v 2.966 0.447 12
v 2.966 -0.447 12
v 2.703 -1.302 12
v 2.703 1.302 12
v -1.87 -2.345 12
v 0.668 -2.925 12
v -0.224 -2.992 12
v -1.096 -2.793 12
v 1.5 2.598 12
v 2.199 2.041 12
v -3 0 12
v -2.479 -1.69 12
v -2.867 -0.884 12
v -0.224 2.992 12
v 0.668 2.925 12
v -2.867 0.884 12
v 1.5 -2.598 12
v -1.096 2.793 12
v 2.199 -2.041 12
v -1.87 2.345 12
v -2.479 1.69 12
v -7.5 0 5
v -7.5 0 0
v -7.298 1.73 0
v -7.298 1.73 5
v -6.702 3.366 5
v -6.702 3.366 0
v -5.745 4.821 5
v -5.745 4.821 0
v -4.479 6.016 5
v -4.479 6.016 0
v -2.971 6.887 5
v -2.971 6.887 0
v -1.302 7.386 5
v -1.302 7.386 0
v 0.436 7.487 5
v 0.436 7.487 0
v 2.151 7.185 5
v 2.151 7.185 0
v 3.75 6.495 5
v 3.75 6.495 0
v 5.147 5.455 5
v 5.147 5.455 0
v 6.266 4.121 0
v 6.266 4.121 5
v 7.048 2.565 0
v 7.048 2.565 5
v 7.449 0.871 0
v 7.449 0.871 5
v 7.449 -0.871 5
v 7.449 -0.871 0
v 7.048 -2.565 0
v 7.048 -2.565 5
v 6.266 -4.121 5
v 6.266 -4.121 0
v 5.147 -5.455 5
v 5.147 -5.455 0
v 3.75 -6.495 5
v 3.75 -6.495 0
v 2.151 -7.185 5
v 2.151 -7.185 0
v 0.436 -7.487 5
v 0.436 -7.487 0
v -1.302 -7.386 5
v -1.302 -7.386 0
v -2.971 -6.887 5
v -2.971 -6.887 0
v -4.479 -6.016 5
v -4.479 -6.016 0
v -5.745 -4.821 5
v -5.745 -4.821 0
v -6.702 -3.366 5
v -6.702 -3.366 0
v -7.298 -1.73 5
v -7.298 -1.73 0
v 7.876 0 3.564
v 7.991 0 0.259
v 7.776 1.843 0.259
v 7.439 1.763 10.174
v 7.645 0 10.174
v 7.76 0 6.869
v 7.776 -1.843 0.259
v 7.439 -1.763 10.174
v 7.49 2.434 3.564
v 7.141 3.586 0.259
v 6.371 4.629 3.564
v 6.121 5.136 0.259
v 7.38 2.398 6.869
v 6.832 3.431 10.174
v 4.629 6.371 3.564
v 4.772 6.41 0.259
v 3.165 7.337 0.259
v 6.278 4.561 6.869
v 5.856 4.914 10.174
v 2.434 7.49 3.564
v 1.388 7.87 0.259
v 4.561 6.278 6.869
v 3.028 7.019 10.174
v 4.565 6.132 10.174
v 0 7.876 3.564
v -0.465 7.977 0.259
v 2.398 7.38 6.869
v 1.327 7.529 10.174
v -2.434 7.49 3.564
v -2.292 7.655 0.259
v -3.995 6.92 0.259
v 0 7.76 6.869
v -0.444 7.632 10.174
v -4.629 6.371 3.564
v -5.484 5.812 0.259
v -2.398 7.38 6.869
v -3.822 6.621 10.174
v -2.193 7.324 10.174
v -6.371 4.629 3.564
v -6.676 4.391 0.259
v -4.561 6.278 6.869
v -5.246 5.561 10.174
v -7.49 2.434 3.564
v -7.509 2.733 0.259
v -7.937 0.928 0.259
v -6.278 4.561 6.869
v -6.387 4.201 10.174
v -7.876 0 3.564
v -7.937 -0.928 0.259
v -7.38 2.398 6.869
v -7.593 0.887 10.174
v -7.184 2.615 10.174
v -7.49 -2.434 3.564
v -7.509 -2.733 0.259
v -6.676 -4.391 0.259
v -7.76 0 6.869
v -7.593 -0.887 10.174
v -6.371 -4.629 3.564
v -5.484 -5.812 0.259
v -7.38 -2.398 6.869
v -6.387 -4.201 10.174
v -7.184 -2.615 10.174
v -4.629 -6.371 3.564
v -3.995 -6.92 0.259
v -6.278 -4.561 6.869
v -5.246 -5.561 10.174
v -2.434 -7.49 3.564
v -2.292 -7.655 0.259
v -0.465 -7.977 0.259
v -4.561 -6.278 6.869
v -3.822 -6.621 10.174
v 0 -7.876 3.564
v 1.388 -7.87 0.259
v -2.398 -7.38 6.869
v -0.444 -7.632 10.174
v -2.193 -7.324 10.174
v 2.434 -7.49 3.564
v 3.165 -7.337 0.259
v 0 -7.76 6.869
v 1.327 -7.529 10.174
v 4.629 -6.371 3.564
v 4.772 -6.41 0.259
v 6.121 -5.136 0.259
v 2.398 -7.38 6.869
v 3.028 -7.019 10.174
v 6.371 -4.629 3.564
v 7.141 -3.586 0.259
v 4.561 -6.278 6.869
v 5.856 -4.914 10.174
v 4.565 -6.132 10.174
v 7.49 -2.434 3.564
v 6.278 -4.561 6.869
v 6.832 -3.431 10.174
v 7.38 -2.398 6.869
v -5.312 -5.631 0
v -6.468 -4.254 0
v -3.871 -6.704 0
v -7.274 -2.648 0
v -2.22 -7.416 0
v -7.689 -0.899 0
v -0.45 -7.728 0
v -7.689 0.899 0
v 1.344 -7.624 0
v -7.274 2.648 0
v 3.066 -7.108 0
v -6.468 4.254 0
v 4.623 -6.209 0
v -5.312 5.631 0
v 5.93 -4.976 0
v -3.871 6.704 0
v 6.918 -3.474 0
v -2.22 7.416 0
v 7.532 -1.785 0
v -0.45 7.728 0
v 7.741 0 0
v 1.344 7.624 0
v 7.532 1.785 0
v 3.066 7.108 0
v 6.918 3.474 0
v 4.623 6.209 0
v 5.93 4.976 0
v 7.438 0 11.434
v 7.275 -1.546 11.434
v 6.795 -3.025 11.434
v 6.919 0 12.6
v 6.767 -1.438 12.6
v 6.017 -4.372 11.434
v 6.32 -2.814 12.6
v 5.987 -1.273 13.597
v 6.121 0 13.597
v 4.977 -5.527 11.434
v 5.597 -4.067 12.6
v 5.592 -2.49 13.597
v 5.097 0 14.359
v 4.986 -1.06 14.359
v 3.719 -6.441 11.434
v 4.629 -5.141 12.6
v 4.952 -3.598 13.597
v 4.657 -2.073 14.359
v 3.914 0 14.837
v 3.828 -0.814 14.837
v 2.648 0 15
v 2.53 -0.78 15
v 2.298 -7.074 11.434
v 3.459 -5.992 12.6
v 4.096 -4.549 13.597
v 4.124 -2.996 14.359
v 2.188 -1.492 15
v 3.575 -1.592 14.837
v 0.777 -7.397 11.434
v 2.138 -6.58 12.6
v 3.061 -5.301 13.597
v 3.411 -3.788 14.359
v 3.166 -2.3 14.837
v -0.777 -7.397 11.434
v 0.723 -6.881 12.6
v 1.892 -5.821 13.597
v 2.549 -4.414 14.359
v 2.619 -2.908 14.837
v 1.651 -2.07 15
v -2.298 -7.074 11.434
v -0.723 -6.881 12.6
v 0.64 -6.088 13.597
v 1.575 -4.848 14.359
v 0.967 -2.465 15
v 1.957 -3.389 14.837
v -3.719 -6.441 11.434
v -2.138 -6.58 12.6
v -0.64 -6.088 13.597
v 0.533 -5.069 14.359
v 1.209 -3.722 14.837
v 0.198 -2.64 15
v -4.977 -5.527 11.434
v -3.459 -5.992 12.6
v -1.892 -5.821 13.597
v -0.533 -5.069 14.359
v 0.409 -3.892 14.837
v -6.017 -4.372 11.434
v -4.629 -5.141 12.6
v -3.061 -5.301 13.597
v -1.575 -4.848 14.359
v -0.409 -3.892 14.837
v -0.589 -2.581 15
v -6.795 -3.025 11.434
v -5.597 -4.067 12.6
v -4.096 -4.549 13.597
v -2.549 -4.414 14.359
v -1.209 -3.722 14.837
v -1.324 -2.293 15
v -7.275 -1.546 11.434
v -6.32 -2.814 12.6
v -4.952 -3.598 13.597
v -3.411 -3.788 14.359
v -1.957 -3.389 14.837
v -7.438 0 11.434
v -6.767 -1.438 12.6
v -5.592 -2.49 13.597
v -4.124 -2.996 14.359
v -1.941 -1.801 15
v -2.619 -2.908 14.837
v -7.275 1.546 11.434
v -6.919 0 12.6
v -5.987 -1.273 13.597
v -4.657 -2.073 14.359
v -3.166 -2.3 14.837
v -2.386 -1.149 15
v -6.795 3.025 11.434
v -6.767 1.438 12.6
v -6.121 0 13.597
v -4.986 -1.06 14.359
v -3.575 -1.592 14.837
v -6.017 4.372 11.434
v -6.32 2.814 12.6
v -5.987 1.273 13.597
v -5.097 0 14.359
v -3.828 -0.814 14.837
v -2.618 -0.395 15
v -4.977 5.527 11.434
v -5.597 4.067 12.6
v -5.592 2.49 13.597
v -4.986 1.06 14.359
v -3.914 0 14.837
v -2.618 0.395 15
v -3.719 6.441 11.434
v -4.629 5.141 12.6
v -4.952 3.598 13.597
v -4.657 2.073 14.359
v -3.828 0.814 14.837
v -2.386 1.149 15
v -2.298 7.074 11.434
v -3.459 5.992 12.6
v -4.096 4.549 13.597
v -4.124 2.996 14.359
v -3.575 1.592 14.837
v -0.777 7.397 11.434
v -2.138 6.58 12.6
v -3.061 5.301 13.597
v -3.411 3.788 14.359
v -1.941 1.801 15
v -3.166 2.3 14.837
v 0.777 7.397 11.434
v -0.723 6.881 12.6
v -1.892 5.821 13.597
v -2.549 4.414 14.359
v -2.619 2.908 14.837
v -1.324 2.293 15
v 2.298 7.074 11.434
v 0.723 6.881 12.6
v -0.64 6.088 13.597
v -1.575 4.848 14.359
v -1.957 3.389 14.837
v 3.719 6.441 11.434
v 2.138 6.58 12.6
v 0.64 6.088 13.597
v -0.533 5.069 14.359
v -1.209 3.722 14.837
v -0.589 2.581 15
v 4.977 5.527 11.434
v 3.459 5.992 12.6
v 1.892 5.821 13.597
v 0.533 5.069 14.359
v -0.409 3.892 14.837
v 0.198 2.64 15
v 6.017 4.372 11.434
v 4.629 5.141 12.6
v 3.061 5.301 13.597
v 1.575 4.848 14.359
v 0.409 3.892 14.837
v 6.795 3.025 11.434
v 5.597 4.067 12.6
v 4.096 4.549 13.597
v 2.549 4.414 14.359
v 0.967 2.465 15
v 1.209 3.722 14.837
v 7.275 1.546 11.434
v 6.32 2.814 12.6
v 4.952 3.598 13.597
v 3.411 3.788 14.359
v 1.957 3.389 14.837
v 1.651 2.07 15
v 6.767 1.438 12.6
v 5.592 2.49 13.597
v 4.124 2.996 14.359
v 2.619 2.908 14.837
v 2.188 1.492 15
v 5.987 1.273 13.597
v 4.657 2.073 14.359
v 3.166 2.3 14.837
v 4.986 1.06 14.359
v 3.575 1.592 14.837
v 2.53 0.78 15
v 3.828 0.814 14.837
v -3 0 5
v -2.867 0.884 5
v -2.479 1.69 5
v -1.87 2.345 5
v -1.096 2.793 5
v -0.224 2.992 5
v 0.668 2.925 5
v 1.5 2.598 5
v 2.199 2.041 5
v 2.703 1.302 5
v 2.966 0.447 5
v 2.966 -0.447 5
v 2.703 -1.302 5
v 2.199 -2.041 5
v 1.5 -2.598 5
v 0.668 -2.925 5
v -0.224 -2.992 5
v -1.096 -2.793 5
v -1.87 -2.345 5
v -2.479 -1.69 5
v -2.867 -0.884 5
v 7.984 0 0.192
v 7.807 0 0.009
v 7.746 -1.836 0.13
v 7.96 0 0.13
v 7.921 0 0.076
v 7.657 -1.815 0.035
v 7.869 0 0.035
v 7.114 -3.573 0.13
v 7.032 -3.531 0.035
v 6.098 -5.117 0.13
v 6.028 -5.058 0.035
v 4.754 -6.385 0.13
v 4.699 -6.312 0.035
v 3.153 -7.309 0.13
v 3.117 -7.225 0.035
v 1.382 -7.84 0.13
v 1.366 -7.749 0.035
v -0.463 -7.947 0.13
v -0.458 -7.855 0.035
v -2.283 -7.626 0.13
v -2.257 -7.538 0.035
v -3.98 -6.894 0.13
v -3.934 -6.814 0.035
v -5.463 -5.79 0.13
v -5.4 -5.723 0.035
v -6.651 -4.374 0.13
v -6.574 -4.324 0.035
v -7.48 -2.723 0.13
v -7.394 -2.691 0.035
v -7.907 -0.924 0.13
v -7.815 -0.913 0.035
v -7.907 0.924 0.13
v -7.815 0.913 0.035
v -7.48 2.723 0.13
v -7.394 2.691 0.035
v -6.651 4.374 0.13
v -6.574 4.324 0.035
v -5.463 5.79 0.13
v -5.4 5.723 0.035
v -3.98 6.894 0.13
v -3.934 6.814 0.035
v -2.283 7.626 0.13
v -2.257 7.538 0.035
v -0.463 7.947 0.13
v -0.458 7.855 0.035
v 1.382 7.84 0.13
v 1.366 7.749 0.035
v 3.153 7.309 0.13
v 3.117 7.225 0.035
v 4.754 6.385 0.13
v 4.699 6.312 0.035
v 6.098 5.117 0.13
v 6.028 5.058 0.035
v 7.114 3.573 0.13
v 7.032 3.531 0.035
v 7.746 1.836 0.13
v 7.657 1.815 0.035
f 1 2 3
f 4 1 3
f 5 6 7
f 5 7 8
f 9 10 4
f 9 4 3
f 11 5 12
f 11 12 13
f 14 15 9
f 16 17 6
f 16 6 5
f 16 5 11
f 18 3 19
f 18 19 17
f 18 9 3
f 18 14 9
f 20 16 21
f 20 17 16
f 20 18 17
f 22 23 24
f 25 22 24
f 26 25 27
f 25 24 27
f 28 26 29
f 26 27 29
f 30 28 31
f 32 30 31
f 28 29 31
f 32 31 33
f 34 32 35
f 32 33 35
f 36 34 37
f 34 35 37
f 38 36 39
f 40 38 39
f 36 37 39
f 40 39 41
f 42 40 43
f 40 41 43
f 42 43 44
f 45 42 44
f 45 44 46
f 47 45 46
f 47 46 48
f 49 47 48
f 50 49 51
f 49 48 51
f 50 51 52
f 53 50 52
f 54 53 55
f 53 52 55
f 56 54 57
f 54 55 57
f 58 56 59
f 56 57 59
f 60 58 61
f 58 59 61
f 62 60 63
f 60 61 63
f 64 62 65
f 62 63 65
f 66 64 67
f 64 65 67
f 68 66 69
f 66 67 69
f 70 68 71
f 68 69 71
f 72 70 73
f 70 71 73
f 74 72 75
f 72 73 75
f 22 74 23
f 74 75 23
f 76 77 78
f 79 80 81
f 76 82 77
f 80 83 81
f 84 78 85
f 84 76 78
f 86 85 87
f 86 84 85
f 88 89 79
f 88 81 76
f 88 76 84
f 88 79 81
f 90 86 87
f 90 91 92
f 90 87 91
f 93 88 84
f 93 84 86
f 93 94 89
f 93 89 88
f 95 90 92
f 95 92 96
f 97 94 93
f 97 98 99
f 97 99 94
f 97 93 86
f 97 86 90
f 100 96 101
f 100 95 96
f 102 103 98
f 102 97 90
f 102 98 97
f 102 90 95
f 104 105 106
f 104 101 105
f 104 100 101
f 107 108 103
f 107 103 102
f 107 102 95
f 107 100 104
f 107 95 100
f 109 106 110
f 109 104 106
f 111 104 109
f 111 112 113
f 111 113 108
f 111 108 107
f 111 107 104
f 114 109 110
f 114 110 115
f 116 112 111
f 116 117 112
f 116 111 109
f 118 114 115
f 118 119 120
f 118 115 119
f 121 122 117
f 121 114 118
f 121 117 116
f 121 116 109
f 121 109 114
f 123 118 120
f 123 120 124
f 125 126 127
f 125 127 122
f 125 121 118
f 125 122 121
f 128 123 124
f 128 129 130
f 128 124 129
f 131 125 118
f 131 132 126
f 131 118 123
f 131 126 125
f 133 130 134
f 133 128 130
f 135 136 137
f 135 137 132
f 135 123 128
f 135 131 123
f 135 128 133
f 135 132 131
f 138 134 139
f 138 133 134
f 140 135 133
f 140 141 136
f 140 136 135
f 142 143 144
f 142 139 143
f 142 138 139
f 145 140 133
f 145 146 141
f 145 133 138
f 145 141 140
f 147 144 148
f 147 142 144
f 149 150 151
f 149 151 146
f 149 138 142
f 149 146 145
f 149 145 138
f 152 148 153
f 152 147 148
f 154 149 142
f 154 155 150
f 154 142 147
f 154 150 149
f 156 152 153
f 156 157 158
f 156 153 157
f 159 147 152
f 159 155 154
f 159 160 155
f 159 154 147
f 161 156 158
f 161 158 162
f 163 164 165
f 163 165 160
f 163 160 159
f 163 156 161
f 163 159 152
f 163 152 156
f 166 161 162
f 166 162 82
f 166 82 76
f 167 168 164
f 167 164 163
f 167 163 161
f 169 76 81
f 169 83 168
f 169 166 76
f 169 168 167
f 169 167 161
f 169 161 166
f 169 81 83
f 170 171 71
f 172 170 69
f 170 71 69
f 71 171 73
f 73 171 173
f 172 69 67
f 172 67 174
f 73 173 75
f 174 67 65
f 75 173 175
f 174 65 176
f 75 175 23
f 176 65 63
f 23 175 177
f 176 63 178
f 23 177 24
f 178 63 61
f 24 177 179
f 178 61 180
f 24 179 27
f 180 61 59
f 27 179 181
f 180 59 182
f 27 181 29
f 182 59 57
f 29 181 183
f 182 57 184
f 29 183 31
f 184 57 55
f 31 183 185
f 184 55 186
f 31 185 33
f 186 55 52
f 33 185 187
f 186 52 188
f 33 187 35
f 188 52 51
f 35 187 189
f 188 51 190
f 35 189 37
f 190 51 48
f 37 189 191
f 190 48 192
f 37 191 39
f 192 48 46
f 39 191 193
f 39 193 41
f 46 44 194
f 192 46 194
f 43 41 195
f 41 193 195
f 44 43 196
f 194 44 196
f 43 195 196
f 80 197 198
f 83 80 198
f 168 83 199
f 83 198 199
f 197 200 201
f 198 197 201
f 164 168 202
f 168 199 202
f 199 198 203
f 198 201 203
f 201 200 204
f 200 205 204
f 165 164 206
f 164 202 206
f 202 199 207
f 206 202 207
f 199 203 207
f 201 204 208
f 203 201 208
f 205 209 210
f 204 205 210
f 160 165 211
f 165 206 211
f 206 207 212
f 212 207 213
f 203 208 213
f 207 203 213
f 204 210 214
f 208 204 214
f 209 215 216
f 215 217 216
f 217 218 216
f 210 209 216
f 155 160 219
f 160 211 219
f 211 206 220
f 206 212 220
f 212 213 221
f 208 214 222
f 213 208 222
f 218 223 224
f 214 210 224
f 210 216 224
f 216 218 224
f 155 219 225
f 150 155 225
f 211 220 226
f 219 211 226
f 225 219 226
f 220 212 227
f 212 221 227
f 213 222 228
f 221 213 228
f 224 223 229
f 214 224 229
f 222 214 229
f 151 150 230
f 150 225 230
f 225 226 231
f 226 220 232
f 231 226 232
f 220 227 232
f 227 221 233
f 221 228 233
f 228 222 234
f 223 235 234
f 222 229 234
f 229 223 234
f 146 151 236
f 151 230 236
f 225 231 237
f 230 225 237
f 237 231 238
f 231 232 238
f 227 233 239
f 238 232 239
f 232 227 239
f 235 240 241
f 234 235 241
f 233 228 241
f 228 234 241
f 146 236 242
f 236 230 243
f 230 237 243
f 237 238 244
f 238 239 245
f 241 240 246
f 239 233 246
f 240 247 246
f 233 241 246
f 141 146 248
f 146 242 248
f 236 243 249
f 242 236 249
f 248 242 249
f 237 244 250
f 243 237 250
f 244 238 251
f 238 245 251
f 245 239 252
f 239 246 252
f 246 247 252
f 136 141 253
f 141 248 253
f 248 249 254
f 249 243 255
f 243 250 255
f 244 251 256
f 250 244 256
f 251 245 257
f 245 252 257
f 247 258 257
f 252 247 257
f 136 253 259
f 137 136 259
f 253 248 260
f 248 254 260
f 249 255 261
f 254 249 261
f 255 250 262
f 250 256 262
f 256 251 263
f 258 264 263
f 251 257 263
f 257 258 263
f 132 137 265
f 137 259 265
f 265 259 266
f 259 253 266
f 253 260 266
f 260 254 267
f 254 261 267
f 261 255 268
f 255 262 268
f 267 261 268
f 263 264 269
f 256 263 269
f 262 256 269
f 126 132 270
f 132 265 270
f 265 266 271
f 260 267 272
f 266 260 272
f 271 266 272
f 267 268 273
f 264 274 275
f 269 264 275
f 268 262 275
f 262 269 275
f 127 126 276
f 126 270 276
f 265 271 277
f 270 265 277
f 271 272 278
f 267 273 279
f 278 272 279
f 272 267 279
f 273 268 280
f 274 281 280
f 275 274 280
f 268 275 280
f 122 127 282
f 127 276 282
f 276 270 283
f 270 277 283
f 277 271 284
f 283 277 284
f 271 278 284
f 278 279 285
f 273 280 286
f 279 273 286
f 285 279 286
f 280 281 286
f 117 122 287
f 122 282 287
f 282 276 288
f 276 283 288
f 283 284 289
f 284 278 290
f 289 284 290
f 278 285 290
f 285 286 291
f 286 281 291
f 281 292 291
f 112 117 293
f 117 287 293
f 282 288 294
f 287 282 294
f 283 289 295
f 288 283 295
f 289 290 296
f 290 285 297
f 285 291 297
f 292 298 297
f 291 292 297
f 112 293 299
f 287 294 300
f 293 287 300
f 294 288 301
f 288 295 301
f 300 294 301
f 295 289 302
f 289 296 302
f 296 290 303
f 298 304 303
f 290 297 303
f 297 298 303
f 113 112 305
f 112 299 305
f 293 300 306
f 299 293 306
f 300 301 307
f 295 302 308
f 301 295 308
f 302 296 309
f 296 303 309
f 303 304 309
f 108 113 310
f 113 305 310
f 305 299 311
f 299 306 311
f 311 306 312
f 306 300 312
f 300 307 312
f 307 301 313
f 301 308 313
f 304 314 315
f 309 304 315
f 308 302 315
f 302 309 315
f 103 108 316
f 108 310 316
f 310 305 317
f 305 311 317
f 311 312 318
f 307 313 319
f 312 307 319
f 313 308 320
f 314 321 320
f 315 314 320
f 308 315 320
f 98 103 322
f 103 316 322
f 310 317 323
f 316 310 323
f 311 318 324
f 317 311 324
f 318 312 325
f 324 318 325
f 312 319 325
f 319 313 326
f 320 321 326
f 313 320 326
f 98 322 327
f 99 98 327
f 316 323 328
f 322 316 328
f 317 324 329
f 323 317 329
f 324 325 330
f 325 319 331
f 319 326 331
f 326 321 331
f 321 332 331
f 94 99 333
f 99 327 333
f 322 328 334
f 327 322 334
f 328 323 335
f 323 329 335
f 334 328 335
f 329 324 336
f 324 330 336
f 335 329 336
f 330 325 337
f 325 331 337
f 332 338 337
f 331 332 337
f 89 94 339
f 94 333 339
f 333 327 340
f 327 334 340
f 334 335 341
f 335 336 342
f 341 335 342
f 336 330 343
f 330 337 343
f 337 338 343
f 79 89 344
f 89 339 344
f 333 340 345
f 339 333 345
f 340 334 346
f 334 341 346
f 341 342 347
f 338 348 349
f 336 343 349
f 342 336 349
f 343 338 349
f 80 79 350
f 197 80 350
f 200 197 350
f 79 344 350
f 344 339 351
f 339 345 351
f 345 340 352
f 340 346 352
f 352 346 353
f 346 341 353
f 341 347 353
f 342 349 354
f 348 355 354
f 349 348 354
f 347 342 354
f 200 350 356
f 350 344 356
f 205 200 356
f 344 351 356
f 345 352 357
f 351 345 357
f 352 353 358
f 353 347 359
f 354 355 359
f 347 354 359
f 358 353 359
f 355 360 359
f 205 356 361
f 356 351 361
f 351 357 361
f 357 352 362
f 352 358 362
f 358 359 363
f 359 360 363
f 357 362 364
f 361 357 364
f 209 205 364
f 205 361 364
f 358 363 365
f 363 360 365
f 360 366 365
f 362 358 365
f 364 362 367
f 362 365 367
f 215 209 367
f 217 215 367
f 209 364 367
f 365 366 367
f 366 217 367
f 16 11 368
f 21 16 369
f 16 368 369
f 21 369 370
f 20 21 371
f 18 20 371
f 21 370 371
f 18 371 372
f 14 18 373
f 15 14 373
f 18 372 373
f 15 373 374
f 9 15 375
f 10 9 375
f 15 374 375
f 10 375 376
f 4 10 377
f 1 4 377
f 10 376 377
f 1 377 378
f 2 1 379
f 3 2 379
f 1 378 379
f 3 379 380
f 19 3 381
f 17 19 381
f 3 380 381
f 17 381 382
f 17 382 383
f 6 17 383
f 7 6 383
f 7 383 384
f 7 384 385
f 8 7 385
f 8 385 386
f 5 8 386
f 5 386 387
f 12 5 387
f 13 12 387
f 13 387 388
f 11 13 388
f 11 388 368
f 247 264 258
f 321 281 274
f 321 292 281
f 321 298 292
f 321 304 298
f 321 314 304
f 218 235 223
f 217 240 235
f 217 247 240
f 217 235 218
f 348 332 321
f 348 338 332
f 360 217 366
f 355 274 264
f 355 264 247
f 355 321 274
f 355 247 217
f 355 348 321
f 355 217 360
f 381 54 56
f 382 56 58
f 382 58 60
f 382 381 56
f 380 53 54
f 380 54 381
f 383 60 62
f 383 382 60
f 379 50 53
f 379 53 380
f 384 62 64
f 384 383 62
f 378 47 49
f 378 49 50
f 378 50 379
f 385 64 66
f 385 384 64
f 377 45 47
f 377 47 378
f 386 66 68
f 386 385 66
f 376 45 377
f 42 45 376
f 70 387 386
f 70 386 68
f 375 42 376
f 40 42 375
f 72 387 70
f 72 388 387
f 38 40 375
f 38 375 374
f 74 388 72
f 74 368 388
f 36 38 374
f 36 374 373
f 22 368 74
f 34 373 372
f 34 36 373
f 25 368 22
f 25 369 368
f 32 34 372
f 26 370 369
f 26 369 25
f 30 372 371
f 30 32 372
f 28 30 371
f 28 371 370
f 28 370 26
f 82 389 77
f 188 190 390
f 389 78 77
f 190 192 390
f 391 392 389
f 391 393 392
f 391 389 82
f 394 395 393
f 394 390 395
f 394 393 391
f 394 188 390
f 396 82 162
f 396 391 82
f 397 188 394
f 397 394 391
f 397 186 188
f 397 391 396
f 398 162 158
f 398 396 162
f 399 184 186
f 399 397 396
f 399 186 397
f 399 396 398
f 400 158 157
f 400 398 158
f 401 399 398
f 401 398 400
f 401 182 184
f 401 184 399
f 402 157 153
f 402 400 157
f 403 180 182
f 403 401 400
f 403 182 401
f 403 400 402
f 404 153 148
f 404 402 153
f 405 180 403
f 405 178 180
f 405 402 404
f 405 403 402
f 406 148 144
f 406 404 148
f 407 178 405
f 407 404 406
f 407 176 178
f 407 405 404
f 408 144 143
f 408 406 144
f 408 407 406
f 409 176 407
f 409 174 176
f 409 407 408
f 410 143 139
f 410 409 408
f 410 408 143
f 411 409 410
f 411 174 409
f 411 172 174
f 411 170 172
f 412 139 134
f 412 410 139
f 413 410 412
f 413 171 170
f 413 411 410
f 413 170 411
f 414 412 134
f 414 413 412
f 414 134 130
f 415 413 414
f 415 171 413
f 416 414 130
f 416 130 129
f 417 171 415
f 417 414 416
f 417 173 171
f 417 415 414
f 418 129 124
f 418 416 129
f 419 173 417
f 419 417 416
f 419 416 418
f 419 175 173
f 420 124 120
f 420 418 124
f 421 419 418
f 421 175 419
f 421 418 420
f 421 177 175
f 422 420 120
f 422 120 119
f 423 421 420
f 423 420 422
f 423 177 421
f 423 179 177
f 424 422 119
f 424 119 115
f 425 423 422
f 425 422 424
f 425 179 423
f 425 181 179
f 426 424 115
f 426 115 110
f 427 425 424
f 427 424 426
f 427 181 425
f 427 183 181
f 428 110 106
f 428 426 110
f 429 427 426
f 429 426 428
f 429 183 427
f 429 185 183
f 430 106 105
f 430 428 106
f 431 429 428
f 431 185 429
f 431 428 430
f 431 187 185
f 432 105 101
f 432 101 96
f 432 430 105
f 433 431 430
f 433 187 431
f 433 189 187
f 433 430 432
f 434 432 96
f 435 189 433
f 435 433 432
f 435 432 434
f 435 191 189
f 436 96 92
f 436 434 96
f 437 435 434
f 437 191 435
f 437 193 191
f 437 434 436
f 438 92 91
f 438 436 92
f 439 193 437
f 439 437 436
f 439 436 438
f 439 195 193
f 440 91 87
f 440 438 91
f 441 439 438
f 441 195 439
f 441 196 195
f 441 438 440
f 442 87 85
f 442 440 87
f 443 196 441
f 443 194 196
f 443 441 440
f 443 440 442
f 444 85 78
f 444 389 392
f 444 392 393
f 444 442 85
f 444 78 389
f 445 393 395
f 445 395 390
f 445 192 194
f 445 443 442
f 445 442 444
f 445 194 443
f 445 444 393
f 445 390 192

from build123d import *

# Parameters (mm, degrees)
ESQUISSE1_R             = 8
BOSS_EXTRU_1_DEPTH      = 15
BOSS_EXTRU_1_TAPER      = 2
CONG_1_R                = 5
ESQUISSE2_R             = 3
ENL_V_MAT_EXTRU_1_DEPTH = 12
ESQUISSE3_R             = 7.5
ENL_V_MAT_EXTRU_2_DEPTH = 5
CONG_2_R                = 0.25


with BuildPart() as part:
    # Esquisse1 → Boss.-Extru.1 (new body)
    with BuildSketch(Plane.XY):
        Circle(ESQUISSE1_R)
    extrude(amount=BOSS_EXTRU_1_DEPTH, taper=BOSS_EXTRU_1_TAPER)

    # Congé1
    cong_1_edges = [part.edges().sort_by_distance(p)[0] for p in [
        (-7.476188458, 0, 15),
    ]]
    fillet(cong_1_edges, radius=CONG_1_R)

    # Esquisse2 → Enlèv. mat.-Extru.1 (cut)
    with BuildSketch(Plane(origin=(0, 0, 0), x_dir=(-1, 0, 0), z_dir=(0, 0, -1))):
        Circle(ESQUISSE2_R)
    extrude(amount=-ENL_V_MAT_EXTRU_1_DEPTH, mode=Mode.SUBTRACT)

    # Esquisse3 → Enlèv. mat.-Extru.2 (cut)
    with BuildSketch(Plane(origin=(0, 0, 0), x_dir=(-1, 0, 0), z_dir=(0, 0, -1))):
        Circle(ESQUISSE3_R)
    extrude(amount=-ENL_V_MAT_EXTRU_2_DEPTH, mode=Mode.SUBTRACT)

    # Congé2
    cong_2_edges = [part.edges().sort_by_distance(p)[0] for p in [
        (-8, 0, 0),
    ]]
    fillet(cong_2_edges, radius=CONG_2_R)


solid = part.part
